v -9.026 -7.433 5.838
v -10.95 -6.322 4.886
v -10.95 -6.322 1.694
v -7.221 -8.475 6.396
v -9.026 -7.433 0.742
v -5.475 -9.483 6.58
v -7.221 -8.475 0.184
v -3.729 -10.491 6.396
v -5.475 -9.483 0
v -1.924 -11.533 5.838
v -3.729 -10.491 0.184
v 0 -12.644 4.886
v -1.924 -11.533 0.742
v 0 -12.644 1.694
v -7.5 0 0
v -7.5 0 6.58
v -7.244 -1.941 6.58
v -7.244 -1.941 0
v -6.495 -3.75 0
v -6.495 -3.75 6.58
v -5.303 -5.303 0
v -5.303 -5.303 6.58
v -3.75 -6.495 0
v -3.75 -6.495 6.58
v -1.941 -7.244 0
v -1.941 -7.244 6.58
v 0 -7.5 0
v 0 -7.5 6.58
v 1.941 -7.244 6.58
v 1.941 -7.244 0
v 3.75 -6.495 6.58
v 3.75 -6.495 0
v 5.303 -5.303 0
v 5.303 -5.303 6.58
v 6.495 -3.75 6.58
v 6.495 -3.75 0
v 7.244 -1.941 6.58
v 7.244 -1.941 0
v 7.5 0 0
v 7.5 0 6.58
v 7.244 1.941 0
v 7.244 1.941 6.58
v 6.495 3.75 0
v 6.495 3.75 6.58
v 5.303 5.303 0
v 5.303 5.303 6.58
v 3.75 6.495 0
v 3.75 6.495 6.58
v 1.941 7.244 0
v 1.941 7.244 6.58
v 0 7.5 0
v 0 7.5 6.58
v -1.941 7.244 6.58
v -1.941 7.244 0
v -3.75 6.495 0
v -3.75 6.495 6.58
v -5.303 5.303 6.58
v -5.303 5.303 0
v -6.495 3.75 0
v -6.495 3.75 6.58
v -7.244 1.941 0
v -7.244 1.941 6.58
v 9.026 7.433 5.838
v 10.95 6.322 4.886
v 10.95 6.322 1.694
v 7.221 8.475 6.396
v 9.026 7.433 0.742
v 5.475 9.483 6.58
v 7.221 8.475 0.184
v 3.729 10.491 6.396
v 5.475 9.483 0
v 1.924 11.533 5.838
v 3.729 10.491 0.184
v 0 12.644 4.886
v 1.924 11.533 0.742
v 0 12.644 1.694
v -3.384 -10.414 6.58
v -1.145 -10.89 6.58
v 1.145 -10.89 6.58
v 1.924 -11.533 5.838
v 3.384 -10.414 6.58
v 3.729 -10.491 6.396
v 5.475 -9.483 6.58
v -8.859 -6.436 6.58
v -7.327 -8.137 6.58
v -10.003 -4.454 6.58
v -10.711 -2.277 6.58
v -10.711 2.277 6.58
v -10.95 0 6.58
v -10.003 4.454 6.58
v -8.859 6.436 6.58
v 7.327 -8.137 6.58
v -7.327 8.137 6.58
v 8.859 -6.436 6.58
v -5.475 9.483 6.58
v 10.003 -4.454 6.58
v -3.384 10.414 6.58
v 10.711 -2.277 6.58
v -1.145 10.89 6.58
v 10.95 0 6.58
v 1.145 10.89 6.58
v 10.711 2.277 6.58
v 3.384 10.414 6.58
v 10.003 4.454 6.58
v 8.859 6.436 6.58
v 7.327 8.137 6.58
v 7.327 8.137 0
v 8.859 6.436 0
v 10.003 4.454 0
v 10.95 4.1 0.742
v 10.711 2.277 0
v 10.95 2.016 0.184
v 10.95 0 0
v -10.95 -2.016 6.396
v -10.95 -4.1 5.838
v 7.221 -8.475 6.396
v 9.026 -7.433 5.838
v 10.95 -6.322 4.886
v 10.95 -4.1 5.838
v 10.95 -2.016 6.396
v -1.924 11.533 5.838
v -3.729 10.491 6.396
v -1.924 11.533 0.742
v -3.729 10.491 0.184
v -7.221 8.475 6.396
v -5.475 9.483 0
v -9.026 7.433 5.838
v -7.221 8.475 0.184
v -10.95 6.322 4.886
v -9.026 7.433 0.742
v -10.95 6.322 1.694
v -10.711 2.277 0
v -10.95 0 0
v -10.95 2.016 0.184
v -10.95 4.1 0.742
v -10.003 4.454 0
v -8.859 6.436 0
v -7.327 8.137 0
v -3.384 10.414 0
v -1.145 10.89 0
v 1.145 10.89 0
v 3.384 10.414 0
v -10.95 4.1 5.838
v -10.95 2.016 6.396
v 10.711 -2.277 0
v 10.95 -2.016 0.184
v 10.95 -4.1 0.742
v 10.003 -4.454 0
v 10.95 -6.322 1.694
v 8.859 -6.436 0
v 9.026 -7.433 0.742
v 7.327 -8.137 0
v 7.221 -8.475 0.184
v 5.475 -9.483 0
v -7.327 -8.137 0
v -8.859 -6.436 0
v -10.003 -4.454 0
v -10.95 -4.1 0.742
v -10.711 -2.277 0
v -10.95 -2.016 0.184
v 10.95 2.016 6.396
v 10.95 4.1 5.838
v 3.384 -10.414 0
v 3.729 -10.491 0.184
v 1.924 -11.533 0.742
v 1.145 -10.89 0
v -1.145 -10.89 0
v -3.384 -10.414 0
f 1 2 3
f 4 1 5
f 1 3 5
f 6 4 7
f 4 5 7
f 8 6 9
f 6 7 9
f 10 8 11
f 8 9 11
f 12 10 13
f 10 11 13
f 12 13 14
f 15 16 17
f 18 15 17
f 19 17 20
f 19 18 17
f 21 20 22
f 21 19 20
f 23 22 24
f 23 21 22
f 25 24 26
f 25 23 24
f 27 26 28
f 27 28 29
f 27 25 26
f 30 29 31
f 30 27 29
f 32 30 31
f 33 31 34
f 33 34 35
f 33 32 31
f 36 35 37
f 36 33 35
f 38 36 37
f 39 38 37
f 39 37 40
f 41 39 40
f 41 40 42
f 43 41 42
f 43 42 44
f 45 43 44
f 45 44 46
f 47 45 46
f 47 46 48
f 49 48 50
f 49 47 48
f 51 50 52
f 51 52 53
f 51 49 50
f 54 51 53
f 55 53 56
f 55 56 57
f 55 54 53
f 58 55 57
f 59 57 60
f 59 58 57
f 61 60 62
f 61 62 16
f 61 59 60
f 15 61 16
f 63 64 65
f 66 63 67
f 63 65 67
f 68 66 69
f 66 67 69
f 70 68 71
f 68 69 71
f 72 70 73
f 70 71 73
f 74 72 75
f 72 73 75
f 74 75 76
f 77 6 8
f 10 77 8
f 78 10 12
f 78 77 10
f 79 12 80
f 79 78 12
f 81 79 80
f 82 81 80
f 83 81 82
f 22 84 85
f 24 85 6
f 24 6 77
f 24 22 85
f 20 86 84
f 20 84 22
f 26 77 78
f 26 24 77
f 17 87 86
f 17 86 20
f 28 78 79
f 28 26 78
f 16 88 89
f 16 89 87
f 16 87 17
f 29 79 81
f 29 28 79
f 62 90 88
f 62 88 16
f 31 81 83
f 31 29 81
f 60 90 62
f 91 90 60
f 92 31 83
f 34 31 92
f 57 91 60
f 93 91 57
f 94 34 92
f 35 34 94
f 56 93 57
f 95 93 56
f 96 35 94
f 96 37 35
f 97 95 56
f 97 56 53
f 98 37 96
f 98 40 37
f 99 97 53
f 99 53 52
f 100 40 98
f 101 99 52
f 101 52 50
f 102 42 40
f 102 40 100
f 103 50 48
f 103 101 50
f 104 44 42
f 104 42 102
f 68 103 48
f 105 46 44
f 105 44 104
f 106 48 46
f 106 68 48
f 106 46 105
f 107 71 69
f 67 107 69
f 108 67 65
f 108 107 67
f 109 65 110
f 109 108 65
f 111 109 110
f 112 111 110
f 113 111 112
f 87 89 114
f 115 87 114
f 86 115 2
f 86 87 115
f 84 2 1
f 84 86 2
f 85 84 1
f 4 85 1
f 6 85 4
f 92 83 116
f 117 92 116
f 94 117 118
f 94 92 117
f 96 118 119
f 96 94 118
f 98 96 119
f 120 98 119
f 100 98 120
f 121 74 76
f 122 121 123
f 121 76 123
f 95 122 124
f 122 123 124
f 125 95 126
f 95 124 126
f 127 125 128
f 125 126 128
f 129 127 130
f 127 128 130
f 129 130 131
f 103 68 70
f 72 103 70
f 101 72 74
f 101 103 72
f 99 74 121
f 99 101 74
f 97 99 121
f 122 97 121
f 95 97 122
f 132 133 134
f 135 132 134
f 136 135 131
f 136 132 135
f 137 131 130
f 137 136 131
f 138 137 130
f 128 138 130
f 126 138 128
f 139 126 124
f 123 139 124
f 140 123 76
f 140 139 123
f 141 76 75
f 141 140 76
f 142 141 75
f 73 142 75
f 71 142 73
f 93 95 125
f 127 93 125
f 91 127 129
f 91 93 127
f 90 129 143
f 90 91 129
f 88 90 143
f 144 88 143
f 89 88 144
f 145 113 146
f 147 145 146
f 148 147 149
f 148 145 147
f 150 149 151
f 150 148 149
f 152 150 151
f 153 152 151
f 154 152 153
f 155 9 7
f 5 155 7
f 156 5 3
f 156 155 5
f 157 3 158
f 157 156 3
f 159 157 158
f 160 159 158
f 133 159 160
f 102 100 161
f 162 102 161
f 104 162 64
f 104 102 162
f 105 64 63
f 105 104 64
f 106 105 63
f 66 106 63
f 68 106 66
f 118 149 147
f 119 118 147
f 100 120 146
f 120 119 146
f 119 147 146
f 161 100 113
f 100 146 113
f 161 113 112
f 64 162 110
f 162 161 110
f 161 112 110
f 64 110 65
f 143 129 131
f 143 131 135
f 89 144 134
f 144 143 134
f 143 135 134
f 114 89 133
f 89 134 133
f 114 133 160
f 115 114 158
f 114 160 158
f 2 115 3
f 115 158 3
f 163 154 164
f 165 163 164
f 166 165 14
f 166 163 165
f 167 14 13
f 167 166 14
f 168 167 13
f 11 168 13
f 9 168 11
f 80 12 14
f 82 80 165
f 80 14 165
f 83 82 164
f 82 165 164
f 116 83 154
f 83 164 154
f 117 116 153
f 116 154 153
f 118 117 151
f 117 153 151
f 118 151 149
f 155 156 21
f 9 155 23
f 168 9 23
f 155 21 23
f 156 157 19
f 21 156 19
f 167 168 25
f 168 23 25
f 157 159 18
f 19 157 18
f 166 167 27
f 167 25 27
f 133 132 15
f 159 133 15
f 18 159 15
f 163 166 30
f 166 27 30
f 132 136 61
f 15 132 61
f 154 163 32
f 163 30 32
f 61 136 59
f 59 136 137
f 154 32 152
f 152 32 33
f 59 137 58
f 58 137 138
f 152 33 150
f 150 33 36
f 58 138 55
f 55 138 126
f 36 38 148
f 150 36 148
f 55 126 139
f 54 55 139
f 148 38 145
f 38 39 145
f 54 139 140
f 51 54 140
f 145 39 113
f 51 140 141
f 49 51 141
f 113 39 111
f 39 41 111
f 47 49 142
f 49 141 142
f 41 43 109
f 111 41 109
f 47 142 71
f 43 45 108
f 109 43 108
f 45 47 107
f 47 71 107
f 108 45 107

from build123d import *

# Parameters (mm, degrees)
SKETCH1_R               = 7.5
BOSS_EXTRUDE1_DEPTH     = 6.58
SKETCH2_OUTSIDE_W       = 43.878
SKETCH2_OUTSIDE_H       = 47.266
SKETCH2_OUTSIDE_R       = 10.95
CUT_EXTRUDE1_DEPTH      = 6.58
CUT_EXTRUDE1_DRAFT      = -45
MIRROR1_COPY_1_SKETCH_W = 43.878
MIRROR1_COPY_1_SKETCH_H = 47.266
MIRROR1_COPY_1_SKETCH_R = 10.95
MIRROR1_COPY_1_DEPTH    = 6.58
MIRROR1_COPY_1_DRAFT    = -45


with BuildPart() as part:
    # Sketch1 → Boss-Extrude1 (new body)
    with BuildSketch(Plane.XY):
        Polygon((0, 12.643970895), (-10.95, 6.321985448), (-10.95, -6.321985448), (0, -12.643970895), (10.95, -6.321985448), (10.95, 6.321985448), align=None)
        with Locations(Location((0, 0, 0), (0, 0, 180))):
            Circle(SKETCH1_R, mode=Mode.SUBTRACT)
    extrude(amount=BOSS_EXTRUDE1_DEPTH)


with BuildPart() as cut_extrude1_tool:
    # Sketch2 outside → Cut-Extrude1 (with draft: the straight prism first)
    with BuildSketch(Plane.XY.offset(6.58)):
        Rectangle(SKETCH2_OUTSIDE_W, SKETCH2_OUTSIDE_H)
        Circle(SKETCH2_OUTSIDE_R, mode=Mode.SUBTRACT)
    extrude(amount=-CUT_EXTRUDE1_DEPTH)
    # Cut-Extrude1: the draft: its side faces are tilted about the plane it starts from
    cut_extrude1_sides = [cut_extrude1_tool.faces().sort_by_distance(p)[0] for p in [
        (0, -23.633, 3.29),
        (21.939, 0, 3.29),
        (0, 23.633, 3.29),
        (-21.939, 0, 3.29),
        (-10.95, 0, 3.29),
    ]]
    draft(cut_extrude1_sides, Plane.XY.offset(6.58), CUT_EXTRUDE1_DRAFT)


with BuildPart() as part_1:
    add(part.part)

    # Cut-Extrude1: cut by cut_extrude1_tool
    add(cut_extrude1_tool.part, mode=Mode.SUBTRACT)


with BuildPart() as mirror1_copy_1_tool:
    # Mirror1 copy 1 sketch → Mirror1 copy 1 (with draft: the straight prism first)
    with BuildSketch(Plane(origin=(0, 0, 0), x_dir=(1, 0, 0), z_dir=(0, 0, -1))):
        Rectangle(MIRROR1_COPY_1_SKETCH_W, MIRROR1_COPY_1_SKETCH_H)
        Circle(MIRROR1_COPY_1_SKETCH_R, mode=Mode.SUBTRACT)
    extrude(amount=-MIRROR1_COPY_1_DEPTH)
    # Mirror1 copy 1: the draft: its side faces are tilted about the plane it starts from
    mirror1_copy_1_sides = [mirror1_copy_1_tool.faces().sort_by_distance(p)[0] for p in [
        (0, -23.633, 3.29),
        (21.939, 0, 3.29),
        (0, 23.633, 3.29),
        (-21.939, 0, 3.29),
        (-10.95, 0, 3.29),
    ]]
    draft(mirror1_copy_1_sides, Plane(origin=(0, 0, 0), x_dir=(1, 0, 0), z_dir=(0, 0, -1)), MIRROR1_COPY_1_DRAFT)


with BuildPart() as part_2:
    add(part_1.part)

    # Mirror1 copy 1: cut by mirror1_copy_1_tool
    add(mirror1_copy_1_tool.part, mode=Mode.SUBTRACT)


solid = part_2.part
